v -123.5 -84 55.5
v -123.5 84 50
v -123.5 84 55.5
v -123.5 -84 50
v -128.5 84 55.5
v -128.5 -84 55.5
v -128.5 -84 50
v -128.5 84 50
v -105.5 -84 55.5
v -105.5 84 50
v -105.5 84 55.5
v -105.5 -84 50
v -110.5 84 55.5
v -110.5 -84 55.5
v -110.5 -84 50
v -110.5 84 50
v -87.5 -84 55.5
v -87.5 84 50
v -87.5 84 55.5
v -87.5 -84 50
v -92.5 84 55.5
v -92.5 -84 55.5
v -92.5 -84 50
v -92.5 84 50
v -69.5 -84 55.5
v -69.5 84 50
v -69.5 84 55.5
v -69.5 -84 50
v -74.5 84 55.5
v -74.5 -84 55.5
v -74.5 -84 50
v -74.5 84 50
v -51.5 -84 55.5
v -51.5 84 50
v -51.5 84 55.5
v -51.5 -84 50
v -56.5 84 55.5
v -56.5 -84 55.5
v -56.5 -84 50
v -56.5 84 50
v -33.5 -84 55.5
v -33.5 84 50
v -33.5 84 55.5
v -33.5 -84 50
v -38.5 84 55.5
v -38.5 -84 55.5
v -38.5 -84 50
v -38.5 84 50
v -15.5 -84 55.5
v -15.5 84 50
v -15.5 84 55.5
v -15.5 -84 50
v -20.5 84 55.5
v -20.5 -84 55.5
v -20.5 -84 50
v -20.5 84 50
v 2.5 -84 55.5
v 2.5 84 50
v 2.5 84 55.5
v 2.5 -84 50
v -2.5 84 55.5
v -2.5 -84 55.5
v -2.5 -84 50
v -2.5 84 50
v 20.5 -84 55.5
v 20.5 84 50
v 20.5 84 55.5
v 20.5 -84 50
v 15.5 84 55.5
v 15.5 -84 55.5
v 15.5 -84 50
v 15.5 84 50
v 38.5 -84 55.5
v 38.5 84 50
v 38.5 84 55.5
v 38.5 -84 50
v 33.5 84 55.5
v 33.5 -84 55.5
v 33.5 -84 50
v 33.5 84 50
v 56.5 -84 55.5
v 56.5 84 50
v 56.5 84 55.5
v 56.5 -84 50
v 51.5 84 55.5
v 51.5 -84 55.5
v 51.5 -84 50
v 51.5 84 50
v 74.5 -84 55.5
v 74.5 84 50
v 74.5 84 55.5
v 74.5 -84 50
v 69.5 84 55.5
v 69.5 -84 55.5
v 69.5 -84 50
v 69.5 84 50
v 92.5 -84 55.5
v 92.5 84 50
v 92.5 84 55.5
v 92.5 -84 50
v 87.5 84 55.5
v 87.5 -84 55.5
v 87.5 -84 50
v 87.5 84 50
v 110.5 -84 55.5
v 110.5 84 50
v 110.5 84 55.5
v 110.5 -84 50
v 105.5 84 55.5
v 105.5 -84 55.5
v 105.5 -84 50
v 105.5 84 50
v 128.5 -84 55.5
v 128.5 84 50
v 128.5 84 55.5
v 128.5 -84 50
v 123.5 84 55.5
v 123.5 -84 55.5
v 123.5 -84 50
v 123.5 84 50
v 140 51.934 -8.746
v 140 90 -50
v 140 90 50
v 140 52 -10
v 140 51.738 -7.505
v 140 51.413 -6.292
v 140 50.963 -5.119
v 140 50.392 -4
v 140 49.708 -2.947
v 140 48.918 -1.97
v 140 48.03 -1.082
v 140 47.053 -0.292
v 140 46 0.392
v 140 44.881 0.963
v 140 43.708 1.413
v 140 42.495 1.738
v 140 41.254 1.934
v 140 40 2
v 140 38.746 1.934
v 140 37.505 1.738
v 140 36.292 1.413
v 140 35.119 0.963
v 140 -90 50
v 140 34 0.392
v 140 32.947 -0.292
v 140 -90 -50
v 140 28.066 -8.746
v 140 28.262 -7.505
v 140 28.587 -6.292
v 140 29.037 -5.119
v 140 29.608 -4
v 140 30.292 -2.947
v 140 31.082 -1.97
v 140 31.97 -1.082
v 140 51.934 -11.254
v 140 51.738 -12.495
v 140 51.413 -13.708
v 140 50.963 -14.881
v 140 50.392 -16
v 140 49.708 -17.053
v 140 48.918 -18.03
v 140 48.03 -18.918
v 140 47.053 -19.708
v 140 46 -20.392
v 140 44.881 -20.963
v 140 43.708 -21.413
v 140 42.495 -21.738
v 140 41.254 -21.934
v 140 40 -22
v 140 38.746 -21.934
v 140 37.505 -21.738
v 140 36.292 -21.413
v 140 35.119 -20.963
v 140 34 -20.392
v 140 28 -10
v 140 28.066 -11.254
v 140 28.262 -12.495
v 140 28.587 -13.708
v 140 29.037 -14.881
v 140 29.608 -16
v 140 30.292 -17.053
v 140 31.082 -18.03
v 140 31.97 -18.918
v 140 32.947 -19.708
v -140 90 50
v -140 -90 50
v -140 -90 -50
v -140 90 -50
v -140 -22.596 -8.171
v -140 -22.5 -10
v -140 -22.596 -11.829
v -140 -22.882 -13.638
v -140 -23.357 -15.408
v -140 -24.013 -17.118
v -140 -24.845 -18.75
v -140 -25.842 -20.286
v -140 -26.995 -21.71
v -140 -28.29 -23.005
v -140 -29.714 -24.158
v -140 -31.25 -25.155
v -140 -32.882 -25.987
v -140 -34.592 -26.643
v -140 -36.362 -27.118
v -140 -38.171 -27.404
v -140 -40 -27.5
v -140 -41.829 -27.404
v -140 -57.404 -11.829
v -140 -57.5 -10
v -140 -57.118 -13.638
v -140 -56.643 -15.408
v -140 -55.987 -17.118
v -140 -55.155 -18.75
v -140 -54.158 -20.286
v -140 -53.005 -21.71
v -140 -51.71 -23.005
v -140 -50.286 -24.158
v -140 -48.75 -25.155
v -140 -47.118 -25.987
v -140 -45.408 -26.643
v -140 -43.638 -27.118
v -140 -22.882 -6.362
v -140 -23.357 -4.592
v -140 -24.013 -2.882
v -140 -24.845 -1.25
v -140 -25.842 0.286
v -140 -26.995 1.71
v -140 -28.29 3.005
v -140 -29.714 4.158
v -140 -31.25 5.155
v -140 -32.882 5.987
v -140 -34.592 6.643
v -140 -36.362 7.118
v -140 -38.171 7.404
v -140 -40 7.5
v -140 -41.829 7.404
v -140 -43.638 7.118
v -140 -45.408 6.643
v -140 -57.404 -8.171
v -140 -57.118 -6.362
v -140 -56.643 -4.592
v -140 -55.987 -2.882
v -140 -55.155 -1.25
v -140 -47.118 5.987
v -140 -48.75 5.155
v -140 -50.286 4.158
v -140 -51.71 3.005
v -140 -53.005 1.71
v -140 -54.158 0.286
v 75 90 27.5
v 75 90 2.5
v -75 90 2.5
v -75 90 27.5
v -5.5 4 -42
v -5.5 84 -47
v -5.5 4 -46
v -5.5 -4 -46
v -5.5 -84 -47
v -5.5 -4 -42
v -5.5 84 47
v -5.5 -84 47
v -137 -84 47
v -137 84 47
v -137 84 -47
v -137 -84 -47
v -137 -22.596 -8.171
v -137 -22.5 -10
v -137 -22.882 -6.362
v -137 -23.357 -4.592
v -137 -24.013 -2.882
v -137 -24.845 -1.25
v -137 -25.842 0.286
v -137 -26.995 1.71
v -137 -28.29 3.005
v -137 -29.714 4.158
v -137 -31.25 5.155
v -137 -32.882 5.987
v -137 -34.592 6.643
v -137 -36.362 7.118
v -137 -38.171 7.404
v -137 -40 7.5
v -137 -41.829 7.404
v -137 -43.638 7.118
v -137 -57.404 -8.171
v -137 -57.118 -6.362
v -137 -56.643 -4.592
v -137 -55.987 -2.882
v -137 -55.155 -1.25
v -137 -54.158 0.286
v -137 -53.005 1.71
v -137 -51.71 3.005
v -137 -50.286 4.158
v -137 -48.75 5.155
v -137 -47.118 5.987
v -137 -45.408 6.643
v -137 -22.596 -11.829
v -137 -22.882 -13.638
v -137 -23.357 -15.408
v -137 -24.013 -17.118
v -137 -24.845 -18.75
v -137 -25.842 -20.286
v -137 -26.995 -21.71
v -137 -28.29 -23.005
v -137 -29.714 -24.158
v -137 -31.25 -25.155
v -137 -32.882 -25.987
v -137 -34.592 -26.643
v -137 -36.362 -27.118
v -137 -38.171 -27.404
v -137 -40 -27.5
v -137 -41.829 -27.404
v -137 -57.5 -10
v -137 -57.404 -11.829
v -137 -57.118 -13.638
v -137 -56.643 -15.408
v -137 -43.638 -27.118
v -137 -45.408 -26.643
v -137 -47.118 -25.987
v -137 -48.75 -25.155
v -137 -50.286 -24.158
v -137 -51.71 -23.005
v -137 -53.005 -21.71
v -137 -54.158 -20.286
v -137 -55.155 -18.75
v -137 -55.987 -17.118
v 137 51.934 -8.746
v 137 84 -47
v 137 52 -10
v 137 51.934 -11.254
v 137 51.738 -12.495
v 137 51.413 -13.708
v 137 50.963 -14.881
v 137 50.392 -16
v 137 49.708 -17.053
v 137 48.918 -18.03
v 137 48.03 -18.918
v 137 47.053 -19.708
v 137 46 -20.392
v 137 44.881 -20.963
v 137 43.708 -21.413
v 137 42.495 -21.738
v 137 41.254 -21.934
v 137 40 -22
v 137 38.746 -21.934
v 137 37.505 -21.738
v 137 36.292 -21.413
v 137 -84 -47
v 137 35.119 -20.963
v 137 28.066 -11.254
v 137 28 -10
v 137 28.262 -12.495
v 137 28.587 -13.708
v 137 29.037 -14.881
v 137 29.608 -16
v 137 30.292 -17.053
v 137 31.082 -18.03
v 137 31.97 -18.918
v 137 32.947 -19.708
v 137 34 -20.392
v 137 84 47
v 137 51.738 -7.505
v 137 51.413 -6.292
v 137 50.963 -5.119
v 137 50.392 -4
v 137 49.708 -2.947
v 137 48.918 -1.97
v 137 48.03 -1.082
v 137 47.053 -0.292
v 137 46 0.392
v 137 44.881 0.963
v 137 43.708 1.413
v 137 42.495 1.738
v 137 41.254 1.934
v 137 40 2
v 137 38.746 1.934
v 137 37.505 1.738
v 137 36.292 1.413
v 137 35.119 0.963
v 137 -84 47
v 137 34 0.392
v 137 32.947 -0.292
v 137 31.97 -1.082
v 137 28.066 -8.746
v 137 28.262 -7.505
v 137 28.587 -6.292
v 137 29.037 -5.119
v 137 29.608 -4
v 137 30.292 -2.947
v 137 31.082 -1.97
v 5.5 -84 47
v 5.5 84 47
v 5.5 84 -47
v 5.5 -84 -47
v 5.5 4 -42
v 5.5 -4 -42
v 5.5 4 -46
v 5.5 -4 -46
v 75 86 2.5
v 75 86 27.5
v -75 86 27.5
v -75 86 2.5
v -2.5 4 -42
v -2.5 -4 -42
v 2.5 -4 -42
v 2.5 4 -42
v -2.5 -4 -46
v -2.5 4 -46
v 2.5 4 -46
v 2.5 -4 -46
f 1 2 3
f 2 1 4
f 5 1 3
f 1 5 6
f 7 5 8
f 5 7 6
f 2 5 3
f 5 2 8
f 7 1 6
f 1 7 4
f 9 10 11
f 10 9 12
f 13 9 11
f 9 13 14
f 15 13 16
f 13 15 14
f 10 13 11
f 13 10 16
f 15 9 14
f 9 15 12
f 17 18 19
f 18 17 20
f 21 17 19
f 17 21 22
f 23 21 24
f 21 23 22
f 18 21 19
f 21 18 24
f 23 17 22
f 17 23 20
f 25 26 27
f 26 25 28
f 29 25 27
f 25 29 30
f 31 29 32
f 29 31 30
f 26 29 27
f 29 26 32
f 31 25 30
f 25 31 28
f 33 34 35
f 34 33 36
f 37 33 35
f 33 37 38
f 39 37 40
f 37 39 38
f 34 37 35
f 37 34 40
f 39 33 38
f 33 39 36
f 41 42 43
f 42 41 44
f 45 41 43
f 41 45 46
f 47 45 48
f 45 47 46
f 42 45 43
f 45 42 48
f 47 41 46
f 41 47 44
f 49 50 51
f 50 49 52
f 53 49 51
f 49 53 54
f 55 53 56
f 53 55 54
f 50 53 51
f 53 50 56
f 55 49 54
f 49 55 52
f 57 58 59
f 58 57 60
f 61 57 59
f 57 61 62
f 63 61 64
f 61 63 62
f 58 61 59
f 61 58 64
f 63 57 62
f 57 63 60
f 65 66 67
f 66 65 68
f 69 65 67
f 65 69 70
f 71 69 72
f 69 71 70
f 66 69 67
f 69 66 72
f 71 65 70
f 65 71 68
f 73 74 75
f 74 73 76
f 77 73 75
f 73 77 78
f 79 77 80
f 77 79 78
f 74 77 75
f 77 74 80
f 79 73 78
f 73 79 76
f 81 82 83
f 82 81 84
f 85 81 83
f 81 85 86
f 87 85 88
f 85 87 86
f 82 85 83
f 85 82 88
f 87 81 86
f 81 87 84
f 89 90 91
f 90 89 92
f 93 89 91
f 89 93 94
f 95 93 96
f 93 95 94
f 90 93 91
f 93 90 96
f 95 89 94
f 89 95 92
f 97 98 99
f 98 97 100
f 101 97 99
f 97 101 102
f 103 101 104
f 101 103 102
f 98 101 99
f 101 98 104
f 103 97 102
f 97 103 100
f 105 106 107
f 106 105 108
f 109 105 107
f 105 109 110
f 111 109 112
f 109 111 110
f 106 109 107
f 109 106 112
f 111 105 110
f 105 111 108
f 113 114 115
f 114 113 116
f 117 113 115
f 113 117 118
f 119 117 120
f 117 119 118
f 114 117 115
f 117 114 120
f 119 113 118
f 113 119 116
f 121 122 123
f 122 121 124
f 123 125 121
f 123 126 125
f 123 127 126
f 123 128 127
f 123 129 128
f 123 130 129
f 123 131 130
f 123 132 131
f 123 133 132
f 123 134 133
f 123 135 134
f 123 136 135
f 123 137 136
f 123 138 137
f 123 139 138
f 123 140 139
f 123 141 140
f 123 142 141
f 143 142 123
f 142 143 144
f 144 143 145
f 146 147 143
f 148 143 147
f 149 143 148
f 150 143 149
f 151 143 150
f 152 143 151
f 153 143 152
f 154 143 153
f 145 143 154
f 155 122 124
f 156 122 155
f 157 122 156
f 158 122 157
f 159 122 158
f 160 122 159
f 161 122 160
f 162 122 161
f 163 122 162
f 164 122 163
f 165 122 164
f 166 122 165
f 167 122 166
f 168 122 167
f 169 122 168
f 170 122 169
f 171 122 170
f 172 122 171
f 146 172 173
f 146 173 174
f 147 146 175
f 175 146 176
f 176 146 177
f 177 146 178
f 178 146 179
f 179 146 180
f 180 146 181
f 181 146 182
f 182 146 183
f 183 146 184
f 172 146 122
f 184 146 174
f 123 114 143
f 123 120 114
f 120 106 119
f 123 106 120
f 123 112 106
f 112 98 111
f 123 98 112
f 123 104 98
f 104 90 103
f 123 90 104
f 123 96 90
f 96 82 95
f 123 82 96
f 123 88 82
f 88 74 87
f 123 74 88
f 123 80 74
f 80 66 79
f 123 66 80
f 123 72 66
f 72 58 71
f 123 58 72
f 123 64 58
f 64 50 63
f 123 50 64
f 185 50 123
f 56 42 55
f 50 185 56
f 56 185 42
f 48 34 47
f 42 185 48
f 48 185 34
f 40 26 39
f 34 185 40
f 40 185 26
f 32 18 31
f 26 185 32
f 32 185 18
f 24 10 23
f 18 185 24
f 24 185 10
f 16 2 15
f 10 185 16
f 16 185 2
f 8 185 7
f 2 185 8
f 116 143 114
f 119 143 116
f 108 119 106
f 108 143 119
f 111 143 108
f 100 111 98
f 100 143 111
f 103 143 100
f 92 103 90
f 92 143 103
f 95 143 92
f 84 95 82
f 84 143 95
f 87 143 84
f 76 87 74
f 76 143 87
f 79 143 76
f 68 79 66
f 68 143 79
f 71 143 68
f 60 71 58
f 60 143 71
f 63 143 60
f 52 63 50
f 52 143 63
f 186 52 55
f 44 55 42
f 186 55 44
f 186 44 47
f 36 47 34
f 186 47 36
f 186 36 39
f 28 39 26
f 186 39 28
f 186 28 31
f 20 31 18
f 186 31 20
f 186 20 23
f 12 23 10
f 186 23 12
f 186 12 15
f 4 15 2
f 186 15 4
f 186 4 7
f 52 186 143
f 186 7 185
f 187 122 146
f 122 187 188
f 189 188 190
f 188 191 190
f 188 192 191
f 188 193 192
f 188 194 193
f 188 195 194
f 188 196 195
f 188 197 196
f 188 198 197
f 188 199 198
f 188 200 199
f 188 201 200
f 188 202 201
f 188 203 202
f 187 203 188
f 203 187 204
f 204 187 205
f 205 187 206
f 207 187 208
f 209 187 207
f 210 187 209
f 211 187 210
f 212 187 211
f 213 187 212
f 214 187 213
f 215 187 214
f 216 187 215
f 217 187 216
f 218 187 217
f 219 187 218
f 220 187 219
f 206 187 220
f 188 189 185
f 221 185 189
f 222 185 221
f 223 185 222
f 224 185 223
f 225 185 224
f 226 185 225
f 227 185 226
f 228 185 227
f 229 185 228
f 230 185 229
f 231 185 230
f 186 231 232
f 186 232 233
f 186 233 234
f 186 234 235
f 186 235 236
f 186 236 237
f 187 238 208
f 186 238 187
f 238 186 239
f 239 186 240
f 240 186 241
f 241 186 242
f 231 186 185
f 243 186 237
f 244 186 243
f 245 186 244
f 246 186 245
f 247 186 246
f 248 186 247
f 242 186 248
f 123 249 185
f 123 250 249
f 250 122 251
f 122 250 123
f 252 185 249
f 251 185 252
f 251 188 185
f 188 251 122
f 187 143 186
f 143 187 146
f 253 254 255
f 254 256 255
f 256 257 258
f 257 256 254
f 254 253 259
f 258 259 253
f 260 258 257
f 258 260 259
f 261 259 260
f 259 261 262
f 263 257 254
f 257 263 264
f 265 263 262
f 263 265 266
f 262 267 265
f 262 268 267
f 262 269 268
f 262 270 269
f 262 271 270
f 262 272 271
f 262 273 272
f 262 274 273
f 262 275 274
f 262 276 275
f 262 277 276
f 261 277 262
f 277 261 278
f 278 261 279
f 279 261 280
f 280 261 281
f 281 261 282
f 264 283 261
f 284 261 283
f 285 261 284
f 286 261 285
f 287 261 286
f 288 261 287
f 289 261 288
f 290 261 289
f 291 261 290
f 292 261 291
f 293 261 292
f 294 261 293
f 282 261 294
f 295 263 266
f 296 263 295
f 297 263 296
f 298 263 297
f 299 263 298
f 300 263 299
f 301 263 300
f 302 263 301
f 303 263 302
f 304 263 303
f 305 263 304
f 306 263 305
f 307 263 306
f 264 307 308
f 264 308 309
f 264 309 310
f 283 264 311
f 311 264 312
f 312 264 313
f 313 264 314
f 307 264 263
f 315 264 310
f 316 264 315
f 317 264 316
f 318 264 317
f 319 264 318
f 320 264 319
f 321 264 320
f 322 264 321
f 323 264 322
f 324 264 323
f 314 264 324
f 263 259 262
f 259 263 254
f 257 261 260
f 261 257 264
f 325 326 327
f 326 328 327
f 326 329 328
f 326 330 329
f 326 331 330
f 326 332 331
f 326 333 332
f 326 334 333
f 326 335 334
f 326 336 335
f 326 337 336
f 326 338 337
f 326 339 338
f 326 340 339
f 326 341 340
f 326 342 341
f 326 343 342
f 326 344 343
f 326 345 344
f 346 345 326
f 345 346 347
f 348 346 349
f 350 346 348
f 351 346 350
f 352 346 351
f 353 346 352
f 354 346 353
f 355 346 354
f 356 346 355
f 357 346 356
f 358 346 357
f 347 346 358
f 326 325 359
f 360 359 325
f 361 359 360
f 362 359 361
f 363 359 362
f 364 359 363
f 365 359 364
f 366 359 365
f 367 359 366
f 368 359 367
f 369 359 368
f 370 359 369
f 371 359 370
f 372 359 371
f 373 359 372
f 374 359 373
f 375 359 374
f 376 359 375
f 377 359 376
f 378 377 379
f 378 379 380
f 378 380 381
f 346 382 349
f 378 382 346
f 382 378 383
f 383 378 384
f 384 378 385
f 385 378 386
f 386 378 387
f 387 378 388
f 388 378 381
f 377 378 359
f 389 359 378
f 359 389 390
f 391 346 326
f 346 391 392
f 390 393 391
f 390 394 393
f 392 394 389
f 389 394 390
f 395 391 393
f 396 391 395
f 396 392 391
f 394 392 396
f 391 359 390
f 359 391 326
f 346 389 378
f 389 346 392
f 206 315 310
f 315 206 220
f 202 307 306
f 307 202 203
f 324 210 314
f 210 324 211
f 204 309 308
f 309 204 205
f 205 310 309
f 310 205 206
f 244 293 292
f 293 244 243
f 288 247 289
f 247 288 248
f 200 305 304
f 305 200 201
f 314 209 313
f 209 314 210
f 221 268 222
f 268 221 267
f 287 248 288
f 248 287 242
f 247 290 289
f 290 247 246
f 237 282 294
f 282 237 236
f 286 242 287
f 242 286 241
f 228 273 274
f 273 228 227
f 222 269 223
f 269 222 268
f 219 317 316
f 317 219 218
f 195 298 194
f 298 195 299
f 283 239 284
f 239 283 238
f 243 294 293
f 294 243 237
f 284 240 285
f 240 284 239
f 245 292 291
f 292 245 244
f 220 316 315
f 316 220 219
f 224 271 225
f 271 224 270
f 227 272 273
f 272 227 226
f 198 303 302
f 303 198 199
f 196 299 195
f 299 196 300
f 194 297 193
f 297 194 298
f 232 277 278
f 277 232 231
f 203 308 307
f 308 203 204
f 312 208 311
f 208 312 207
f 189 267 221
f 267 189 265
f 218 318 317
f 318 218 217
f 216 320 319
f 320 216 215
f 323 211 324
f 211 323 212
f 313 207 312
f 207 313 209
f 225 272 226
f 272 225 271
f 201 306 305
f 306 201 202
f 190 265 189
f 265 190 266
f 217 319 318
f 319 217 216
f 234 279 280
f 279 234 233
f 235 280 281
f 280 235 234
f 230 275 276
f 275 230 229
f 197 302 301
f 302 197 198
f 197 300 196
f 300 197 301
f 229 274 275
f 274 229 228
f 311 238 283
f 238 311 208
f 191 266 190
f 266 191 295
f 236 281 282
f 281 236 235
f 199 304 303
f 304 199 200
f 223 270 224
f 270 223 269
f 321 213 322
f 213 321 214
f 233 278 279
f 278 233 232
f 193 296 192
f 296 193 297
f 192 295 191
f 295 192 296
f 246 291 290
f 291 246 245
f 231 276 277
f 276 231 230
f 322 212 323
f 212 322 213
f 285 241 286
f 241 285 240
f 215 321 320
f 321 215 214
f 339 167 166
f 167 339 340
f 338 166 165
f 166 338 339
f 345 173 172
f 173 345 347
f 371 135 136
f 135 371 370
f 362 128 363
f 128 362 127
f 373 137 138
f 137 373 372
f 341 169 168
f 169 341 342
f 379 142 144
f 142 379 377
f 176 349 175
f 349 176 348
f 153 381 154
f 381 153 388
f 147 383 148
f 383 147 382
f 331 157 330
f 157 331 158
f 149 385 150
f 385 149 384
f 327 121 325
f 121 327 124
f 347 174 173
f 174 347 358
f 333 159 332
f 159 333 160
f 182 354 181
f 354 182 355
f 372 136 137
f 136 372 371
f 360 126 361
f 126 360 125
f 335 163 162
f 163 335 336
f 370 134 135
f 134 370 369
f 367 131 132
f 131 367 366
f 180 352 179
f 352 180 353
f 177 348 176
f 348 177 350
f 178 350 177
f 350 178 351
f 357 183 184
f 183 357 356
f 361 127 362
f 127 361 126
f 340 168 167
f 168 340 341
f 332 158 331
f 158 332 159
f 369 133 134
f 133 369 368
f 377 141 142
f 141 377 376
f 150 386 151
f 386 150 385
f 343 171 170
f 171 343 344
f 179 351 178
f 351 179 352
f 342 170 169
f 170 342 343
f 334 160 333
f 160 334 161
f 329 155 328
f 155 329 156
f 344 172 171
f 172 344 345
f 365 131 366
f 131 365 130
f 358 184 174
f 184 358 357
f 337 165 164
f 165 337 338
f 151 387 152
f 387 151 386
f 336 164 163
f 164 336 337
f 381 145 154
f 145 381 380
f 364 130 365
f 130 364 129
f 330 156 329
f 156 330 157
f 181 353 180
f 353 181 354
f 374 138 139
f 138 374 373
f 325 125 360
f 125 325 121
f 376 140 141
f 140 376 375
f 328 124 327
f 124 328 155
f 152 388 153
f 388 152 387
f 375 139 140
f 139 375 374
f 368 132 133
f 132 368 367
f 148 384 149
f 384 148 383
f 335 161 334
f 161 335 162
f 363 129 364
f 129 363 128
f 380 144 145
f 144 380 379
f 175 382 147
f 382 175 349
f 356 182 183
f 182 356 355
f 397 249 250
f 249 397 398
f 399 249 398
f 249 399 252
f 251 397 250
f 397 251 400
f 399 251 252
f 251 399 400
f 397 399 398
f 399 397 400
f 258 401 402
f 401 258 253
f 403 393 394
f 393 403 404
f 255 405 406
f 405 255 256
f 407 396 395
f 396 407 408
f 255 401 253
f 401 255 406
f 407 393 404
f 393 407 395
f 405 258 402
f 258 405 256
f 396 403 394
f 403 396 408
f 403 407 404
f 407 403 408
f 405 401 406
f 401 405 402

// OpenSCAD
// File Path: src/hardware/ge_amplifier_chassis.scad
// IEC 60664-1 & IPC-2152 Physics-Compliant High-Voltage Shielded Enclosure
// Features an integrated electromagnetic and galvanic internal divider wall.

$fn = 60;

// Central structural enclosure dimensions (in millimeters)
chassis_length = 280.0; // Expanded to support dual isolated internal bays
chassis_width  = 180.0;
chassis_height = 100.0;
wall_thickness = 6.0;   // Thicker aluminum cast wall for extreme environment protection

// IEC 60664-1 Standards Constants for 690V AC Operational Line Systems
iec_clearance_air_gap_mm = 12.0; 
iec_creepage_surface_mm  = 8.0;   // Material Group IIIa, Pollution Degree 2 Threshold
divider_thickness_mm     = 5.0;   // Structural thickness of the internal isolation wall

module ge_dual_cavity_housing() {
    difference() {
        union() {
            // Main Cast Aluminum Rugged Outer Frame Block
            cube([chassis_length, chassis_width, chassis_height], center = true);
            
            // Integrated Cooling Fins designed for high-current albedo thermal decay
            for (i = [-7 : 7]) {
                translate([i * 18, 0, (chassis_height / 2) + 2.5])
                    cube([5.0, chassis_width - 12.0, 6.0], center = true);
            }
        }
        
        // 1. Hollow out Cavity A: The High-Voltage Power Bay (Left Side)
        translate([-(chassis_length / 4) - (divider_thickness_mm / 4), 0, 0])
            cube([
                (chassis_length / 2) - wall_thickness - (divider_thickness_mm / 2), 
                chassis_width - (2 * wall_thickness), 
                chassis_height - wall_thickness
            ], center = true);
            
        // 2. Hollow out Cavity B: The Protected Analog Tracking Low-Noise Bay (Right Side)
        translate([(chassis_length / 4) + (divider_thickness_mm / 4), 0, 0])
            cube([
                (chassis_length / 2) - wall_thickness - (divider_thickness_mm / 2), 
                chassis_width - (2 * wall_thickness), 
                chassis_height - wall_thickness
            ], center = true);
        
        // High-Voltage 690V AC Input Bushing Port Cutout (Pipes into Left Power Bay Only)
        translate([-(chassis_length / 2) - 1, -40, -10])
            rotate([0, 90, 0])
                cylinder(h = wall_thickness + 5, d = 35.0, center = true);
                
        // Low-Power Snap-Circuit Signal Entry Port (Pipes into Right Analog Bay Only)
        translate([(chassis_length / 2) + 1, 40, -10])
            rotate([0, 90, 0])
                cylinder(h = wall_thickness + 5, d = iec_clearance_air_gap_mm + 12.0, center = true);

        // Recessed Laser-Etched GUNDAM ROBOTIC SYSTEMS Side Plate
        translate([0, (chassis_width / 2) - 1, 15])
            cube([150.0, wall_thickness, 25.0], center = true);
            
        // IEC 60664-1 Creepage Surface Isolation Trenches (Milled inside both bays)
        translate([0, 0, -(chassis_height / 2) + wall_thickness])
            cube([chassis_length - 20.0, iec_creepage_surface_mm, 4.0], center = true);
    }
    
    // Concrete Solid Placement of the Form-Molded Inter-Bay Divider Rail
    // This aluminum barrier provides absolute physical isolation and Faraday shielding
    translate([0, 0, -(wall_thickness / 2)])
        cube([divider_thickness_mm, chassis_width - (2 * wall_thickness), chassis_height - wall_thickness], center = true);
}

// Instantiate the dual-cavity high-voltage isolation chassis structure
ge_dual_cavity_housing();
